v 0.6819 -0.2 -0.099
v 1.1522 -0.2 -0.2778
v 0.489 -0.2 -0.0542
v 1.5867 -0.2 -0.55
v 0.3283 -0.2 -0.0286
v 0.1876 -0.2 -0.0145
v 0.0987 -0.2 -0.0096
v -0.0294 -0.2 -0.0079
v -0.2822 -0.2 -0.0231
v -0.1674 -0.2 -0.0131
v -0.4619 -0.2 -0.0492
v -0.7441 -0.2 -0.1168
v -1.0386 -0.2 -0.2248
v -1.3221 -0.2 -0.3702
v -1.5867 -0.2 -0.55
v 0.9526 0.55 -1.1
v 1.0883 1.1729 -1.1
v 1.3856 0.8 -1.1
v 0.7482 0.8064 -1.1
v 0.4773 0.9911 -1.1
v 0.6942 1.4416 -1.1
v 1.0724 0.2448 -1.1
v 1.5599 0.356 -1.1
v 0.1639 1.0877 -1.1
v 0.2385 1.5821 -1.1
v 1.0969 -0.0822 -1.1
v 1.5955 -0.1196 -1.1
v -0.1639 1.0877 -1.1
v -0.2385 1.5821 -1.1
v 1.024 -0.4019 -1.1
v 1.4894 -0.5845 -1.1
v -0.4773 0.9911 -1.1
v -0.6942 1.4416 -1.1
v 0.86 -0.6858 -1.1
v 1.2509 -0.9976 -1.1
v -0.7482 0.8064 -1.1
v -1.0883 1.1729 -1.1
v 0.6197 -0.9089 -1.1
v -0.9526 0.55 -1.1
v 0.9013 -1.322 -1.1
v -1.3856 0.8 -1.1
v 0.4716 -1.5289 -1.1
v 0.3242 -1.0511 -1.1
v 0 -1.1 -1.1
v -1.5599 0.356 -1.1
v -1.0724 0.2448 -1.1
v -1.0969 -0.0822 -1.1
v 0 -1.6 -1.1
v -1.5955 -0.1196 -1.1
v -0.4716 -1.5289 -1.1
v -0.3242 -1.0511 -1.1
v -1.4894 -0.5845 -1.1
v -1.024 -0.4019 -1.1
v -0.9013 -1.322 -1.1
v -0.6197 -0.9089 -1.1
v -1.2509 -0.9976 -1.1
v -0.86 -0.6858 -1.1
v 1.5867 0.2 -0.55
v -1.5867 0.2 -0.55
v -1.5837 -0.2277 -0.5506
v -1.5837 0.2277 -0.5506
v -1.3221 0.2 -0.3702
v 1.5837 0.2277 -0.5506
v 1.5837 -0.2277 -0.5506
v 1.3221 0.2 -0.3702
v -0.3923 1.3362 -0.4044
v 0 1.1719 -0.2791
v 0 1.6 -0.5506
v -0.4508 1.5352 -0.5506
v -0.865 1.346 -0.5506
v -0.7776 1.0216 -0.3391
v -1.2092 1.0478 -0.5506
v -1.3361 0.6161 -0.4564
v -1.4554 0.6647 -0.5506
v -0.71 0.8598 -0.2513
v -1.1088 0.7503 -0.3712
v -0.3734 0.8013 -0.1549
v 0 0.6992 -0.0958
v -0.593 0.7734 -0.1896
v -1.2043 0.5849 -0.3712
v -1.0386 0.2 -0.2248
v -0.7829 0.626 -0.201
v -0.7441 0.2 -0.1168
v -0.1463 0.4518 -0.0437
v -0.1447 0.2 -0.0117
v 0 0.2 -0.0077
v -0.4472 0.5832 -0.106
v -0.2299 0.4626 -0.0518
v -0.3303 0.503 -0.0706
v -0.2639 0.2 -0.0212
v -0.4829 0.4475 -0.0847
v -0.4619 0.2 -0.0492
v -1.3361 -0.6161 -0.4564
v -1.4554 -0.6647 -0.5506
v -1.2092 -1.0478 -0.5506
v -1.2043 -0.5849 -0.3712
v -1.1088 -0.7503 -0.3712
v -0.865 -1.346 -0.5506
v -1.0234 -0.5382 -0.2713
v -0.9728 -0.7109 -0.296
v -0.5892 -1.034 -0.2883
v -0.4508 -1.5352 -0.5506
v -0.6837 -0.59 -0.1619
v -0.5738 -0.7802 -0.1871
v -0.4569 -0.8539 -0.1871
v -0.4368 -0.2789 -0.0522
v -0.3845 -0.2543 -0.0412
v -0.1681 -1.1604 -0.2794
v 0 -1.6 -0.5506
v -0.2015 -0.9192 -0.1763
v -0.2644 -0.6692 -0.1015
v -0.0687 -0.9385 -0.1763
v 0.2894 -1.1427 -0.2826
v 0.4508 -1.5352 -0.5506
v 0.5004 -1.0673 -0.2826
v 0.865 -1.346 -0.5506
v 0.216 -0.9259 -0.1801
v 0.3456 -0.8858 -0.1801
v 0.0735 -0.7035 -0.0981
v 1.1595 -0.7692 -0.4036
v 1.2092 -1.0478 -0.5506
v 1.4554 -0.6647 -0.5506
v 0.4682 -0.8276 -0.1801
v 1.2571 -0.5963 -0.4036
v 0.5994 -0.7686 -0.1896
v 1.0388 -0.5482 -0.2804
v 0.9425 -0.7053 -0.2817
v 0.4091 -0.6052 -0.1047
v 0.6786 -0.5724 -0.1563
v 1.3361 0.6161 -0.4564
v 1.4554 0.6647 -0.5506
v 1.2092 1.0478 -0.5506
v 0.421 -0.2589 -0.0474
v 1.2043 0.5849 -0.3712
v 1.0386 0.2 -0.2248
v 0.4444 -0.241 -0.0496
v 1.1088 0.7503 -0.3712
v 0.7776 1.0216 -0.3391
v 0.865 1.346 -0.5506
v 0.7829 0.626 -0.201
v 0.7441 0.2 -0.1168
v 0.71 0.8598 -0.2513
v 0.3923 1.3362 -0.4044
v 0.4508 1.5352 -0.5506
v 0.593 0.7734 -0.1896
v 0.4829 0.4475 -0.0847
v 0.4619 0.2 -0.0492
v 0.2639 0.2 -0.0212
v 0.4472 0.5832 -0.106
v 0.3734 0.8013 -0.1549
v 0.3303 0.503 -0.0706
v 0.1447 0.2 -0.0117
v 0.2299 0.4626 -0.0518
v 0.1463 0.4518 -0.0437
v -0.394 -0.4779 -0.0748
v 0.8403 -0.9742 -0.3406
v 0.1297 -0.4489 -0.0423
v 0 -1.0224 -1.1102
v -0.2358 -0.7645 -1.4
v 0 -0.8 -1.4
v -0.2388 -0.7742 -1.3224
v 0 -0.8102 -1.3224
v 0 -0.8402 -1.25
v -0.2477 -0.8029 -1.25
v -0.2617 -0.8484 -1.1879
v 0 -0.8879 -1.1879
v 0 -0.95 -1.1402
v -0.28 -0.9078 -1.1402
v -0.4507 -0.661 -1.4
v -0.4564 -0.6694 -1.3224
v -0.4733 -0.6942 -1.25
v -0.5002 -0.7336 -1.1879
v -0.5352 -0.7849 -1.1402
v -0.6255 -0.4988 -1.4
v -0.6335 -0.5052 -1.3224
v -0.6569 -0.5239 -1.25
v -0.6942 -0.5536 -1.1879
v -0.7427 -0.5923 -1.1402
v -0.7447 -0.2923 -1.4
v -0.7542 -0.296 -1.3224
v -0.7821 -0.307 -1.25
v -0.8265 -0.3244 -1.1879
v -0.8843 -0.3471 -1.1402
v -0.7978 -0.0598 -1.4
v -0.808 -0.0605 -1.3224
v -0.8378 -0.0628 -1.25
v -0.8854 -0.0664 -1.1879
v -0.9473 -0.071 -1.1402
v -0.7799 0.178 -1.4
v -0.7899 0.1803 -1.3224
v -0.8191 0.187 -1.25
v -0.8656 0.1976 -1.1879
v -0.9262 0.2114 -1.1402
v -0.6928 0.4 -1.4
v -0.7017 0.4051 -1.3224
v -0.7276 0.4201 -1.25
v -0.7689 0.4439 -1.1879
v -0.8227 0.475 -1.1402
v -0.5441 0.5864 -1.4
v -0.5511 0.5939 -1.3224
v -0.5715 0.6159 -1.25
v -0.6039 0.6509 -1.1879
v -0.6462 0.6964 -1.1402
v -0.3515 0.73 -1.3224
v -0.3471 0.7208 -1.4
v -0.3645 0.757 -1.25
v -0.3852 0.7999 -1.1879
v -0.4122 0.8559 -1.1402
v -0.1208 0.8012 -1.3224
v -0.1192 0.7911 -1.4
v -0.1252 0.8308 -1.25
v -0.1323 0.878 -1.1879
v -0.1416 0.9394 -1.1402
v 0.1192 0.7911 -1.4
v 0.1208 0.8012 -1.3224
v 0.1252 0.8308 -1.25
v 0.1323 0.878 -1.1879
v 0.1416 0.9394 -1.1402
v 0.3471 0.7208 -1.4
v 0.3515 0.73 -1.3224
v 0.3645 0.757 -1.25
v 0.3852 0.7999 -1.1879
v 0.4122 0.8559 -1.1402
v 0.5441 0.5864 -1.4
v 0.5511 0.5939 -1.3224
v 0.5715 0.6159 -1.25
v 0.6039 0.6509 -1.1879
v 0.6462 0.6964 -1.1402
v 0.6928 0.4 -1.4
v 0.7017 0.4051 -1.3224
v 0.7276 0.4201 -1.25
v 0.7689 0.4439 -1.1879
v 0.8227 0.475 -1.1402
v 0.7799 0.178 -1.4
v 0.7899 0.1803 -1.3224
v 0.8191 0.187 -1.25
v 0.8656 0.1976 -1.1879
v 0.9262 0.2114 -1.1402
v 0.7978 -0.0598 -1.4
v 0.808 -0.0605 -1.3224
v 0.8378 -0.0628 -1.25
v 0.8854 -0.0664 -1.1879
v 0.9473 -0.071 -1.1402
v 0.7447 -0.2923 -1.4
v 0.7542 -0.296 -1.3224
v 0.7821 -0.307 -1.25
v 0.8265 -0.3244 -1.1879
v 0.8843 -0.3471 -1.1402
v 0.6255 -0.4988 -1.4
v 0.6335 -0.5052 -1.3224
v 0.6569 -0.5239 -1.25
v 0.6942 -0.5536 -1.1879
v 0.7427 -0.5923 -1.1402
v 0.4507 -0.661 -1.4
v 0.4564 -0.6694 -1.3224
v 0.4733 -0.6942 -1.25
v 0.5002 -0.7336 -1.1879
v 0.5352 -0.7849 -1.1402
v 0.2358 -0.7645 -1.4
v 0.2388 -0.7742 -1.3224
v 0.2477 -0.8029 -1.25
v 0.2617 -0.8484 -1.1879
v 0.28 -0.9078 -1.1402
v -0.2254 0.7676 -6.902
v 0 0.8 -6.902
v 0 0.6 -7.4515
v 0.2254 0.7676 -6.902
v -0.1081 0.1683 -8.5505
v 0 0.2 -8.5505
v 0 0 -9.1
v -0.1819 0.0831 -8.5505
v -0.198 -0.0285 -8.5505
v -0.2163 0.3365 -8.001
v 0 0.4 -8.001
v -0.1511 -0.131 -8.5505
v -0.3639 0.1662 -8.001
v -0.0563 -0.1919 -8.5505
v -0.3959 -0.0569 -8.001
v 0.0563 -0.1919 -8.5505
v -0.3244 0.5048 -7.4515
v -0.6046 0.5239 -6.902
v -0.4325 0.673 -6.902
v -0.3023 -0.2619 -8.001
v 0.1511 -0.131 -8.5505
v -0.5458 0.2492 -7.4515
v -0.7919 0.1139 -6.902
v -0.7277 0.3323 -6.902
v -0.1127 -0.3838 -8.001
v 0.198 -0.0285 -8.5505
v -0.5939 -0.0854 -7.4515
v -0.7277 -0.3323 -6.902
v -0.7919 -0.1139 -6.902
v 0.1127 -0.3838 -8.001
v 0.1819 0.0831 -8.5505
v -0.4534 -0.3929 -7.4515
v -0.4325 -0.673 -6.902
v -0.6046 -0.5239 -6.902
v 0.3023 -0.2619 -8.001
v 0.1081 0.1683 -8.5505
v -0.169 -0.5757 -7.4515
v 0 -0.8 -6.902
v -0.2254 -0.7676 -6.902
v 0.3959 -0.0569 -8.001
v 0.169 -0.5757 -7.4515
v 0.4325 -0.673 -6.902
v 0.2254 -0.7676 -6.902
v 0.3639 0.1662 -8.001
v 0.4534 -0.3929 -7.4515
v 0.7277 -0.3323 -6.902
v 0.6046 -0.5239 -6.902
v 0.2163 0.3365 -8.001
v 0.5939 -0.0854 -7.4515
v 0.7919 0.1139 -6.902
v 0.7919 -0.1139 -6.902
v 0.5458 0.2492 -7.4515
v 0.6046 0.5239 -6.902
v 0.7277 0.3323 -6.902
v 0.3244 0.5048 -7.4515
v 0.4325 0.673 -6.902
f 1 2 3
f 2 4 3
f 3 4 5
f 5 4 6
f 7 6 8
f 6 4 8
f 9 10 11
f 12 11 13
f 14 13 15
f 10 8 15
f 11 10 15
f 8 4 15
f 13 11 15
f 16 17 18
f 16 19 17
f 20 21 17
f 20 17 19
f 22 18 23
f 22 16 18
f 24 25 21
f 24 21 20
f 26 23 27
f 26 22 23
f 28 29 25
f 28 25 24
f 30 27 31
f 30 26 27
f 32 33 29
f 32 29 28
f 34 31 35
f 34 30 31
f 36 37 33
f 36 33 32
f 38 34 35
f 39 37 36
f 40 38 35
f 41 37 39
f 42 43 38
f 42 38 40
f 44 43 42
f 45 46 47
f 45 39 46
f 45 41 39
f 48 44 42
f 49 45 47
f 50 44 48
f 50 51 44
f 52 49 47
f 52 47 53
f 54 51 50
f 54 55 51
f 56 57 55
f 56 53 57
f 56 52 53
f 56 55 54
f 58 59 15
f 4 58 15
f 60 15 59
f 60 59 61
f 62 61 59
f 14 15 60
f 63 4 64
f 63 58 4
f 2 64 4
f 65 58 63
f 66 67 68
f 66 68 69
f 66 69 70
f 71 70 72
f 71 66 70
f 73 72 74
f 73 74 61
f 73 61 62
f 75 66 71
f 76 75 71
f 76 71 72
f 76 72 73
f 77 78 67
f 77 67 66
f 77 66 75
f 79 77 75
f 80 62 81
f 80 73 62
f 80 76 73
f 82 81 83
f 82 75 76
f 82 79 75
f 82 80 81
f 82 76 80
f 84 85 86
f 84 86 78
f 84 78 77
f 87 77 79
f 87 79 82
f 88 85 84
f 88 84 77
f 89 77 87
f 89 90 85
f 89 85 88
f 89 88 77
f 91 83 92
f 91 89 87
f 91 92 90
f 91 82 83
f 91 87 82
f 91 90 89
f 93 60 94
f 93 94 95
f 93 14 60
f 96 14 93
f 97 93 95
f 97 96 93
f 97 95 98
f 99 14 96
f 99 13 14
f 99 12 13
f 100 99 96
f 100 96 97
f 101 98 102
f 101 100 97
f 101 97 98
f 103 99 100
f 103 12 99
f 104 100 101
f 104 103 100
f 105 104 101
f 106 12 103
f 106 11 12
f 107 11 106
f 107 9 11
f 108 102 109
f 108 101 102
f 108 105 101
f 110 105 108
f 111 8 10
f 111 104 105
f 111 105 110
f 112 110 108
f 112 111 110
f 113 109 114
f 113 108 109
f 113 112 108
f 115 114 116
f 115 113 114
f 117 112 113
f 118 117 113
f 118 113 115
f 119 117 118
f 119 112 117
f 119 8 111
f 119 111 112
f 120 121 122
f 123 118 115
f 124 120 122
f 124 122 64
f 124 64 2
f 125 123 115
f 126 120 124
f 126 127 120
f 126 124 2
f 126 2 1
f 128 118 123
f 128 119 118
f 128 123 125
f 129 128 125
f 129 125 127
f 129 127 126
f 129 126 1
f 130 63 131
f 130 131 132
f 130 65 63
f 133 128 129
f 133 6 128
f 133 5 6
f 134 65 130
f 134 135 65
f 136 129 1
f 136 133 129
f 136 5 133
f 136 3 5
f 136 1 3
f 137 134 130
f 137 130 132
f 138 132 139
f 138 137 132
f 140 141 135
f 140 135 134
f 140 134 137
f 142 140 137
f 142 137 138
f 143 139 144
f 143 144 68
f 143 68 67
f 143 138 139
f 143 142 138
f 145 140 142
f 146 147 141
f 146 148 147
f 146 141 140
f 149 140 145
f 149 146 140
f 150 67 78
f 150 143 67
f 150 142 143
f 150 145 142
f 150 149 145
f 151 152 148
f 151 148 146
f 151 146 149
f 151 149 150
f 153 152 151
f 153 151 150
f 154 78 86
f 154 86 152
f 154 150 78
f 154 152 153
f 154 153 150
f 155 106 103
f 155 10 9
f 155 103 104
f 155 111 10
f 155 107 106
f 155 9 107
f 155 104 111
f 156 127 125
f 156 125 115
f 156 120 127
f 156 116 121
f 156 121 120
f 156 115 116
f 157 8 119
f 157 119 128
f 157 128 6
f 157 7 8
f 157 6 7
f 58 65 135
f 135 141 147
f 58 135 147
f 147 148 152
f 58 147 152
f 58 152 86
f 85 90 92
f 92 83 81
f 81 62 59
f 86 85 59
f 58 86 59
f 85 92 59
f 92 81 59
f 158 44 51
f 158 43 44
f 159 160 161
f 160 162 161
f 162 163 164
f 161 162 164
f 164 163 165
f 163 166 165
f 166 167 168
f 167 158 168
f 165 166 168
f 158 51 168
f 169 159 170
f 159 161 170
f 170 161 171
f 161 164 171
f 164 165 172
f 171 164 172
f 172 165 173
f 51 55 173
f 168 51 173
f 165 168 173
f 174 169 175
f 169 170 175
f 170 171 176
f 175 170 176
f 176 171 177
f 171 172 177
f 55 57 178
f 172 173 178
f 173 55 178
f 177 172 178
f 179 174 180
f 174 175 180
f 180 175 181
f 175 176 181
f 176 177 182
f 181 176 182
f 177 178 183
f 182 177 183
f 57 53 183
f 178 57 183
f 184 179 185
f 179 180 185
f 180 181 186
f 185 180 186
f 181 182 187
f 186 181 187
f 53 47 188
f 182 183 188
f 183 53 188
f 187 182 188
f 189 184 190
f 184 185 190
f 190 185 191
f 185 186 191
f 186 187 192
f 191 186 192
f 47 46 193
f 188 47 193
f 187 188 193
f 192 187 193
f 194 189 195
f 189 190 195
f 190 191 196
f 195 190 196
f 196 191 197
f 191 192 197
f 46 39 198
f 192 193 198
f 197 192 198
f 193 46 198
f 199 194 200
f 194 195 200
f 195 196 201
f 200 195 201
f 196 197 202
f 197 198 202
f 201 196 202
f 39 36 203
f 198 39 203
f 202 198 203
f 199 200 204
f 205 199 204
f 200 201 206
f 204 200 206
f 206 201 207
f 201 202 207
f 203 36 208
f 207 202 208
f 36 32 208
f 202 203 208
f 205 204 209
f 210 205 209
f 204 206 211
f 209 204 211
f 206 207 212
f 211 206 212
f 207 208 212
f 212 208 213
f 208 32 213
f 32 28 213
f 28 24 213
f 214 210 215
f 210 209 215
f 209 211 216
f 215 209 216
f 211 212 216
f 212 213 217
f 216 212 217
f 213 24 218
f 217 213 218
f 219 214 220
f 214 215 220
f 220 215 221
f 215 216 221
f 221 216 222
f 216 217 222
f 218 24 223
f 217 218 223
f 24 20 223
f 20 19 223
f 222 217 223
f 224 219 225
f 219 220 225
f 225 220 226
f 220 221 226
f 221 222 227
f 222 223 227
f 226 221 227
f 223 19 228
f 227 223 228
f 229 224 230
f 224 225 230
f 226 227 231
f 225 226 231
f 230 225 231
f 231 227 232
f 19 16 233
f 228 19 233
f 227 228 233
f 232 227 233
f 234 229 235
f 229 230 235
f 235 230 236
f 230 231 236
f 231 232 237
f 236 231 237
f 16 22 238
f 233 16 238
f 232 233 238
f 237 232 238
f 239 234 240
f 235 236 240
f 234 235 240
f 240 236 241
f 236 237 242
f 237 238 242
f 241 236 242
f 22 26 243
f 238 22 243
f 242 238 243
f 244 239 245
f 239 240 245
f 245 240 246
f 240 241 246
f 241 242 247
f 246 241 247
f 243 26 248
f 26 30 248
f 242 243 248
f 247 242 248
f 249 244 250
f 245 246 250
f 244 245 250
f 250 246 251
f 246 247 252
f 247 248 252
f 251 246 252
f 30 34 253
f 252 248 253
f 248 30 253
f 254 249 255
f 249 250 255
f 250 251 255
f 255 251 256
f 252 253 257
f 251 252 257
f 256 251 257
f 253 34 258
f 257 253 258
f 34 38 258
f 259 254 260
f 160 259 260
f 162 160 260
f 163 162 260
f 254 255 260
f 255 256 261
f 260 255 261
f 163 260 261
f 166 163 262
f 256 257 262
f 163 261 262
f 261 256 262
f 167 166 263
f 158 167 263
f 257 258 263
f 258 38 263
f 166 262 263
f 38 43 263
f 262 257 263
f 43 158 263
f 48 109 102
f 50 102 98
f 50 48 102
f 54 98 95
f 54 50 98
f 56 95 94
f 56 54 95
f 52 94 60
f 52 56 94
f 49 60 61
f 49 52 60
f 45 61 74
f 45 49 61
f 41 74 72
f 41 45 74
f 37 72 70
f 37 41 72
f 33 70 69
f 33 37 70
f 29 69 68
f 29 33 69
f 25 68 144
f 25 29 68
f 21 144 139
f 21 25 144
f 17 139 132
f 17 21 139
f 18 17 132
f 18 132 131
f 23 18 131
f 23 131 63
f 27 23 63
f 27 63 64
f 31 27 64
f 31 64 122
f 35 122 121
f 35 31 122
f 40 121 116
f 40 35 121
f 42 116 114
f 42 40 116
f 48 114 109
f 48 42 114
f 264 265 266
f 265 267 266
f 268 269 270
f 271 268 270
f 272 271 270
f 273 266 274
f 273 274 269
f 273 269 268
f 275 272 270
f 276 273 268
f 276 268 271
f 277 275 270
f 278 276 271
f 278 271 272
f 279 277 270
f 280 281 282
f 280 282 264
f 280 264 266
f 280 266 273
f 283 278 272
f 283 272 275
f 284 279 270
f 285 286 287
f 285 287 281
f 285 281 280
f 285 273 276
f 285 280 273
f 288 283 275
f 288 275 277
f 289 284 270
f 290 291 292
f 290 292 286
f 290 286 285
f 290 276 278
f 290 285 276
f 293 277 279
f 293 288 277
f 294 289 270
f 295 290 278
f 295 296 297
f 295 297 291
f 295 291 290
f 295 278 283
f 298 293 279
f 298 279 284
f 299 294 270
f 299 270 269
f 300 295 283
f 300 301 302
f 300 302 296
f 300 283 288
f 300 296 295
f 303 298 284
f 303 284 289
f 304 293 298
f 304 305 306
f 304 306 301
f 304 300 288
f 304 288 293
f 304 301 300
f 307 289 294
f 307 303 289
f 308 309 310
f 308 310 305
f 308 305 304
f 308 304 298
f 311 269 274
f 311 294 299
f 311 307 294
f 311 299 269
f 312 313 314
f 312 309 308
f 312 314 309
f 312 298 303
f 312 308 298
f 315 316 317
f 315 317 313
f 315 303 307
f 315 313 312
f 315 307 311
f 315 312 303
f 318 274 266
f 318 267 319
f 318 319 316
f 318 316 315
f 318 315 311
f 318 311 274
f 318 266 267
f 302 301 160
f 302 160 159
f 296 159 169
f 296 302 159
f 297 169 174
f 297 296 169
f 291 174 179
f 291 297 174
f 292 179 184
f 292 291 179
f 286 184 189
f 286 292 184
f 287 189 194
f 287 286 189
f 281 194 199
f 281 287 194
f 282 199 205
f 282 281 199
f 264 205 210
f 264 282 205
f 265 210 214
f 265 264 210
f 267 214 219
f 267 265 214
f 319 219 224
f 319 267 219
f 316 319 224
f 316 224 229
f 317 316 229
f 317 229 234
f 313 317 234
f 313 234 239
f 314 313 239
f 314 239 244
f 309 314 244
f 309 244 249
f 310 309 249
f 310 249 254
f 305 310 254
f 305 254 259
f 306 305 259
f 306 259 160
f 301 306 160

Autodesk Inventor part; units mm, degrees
ref_plane "YZ Plane" through (0, 0, 0) normal (1, 0, 0) x (0, 1, 0)
ref_plane "XZ Plane" through (0, 0, 0) normal (0, 1, 0) x (-1, 0, 0)
ref_plane "XY Plane" through (0, 0, 0) normal (0, 0, 1) x (1, 0, 0)
sketch "Sketch2" plane through (0, 0, 0) normal (1, 0, 0) x (0, 1, 0)
  line L0 (0.8, -9.1) -> (-0.8, -9.1) projected
  line L1 (0.8, -9.1) -> (0.8, -1.4) projected
  line L2 (0, 1.82) -> (0, -10.92) projected
  line L3 (0, -9.1) -> (0.8, -9.1)
  line L4 (0.8, -6.902) -> (0, -9.1)
  point P0 (0, 0)
  dimension "d55" = 20
sketch "Sketch1" plane through (0, 0, 0) normal (1, 0, 0) x (0, 1, 0)
  line L0 (0, 0) -> (0, -197.906)
  line L1 (0, 0) -> (-1.6, 0)
  line L2 (-1.6, 0) -> (-1.6, -1.1)
  line L3 (-1.6, -1.1) -> (-0.8, -1.1)
  line L4 (-0.8, -1.1) -> (-0.8, -9.1)
  line L5 (0, -9.1) -> (-0.8, -9.1)
  dimension "d0" = 3.2
  dimension "d4" = 1.6
  dimension "d5" = 1.1
  dimension "d42" = 8
revolve "Revolution1" add sketch "Sketch1" angle 360 about axis through (0, 0, 0) along (0, 0, -1)
fillet "Fillet1" radius 0.3 1 edges at (0, 0.8, -1.1)
thread "Thread1" size "1.6x0.7" class "h15" standard "DIN Wood Screw Thread" length 4.8
revolve "Revolution2" cut sketch "Sketch2" angle 360 about axis through (0, 0, 0) along (0, 0, -1)
sketch "Sketch3" plane through (0, 0, 0) normal (1, 0, 0) x (0, 1, 0)
  line L0 (-0.2, 0) -> (0.2, 0)
  line L1 (0.2, 0) -> (0.2, -0.55)
  line L2 (0.2, -0.55) -> (-0.2, -0.55)
  line L3 (-0.2, -0.55) -> (-0.2, 0)
  point P0 (0, 0)
  point P1 (0, 0)
  dimension "d29" = 0.4
  dimension "d30" = 0.55
extrude "Extrusion1" cut sketch "Sketch3" along normal through all both and the other way through all
sketch "Sketch4" plane through (0, 0, 0) normal (1, 0, 0) x (0, 1, 0)
  line L0 (0.2, 0) -> (0.2, 0) projected
  arc A0 (1.6, -0.5506) -> (0, 0) centre (0, -2.6) ccw
  line L1 (1.6, 0) -> (0.2, 0) projected
  line L2 (1.6, -1.1) -> (1.6, 0) projected
  line L3 (0.2, 0) -> (0, 0)
  line L4 (0, -3.1468) -> (0, 0.6806) projected
  dimension "d40" = 2.6
revolve "Revolution3" cut sketch "Sketch4" angle 360 about axis through (0, 0, -10) along (0, 0, 1)
equation "\"d44\" = r"
equation "\"d45\" = GEL"
equation "\"d29\" = SBR"
equation "\"d30\" = STI"
equation "\"d40\" = R1"
equation "\"d0\" = KOD"
equation "\"d4\" = NND"
equation "\"d5\" = KOH"
equation "\"d42\" = NLG"
equation "\"KOD\" = 3.2"
equation "\"NND\" = 1.6"
equation "\"NLG\" = 8"
equation "\"KOH\" = 1.1"
equation "\"R1\" = 2.6"
equation "\"r\" = 0.3"
equation "\"SBR\" = 0.4"
equation "\"STI\" = 0.55"
equation "\"GEL\" = 0.6 * NLG"
properties part number "DIN 96 - 1,6x8" material "Stahl"
